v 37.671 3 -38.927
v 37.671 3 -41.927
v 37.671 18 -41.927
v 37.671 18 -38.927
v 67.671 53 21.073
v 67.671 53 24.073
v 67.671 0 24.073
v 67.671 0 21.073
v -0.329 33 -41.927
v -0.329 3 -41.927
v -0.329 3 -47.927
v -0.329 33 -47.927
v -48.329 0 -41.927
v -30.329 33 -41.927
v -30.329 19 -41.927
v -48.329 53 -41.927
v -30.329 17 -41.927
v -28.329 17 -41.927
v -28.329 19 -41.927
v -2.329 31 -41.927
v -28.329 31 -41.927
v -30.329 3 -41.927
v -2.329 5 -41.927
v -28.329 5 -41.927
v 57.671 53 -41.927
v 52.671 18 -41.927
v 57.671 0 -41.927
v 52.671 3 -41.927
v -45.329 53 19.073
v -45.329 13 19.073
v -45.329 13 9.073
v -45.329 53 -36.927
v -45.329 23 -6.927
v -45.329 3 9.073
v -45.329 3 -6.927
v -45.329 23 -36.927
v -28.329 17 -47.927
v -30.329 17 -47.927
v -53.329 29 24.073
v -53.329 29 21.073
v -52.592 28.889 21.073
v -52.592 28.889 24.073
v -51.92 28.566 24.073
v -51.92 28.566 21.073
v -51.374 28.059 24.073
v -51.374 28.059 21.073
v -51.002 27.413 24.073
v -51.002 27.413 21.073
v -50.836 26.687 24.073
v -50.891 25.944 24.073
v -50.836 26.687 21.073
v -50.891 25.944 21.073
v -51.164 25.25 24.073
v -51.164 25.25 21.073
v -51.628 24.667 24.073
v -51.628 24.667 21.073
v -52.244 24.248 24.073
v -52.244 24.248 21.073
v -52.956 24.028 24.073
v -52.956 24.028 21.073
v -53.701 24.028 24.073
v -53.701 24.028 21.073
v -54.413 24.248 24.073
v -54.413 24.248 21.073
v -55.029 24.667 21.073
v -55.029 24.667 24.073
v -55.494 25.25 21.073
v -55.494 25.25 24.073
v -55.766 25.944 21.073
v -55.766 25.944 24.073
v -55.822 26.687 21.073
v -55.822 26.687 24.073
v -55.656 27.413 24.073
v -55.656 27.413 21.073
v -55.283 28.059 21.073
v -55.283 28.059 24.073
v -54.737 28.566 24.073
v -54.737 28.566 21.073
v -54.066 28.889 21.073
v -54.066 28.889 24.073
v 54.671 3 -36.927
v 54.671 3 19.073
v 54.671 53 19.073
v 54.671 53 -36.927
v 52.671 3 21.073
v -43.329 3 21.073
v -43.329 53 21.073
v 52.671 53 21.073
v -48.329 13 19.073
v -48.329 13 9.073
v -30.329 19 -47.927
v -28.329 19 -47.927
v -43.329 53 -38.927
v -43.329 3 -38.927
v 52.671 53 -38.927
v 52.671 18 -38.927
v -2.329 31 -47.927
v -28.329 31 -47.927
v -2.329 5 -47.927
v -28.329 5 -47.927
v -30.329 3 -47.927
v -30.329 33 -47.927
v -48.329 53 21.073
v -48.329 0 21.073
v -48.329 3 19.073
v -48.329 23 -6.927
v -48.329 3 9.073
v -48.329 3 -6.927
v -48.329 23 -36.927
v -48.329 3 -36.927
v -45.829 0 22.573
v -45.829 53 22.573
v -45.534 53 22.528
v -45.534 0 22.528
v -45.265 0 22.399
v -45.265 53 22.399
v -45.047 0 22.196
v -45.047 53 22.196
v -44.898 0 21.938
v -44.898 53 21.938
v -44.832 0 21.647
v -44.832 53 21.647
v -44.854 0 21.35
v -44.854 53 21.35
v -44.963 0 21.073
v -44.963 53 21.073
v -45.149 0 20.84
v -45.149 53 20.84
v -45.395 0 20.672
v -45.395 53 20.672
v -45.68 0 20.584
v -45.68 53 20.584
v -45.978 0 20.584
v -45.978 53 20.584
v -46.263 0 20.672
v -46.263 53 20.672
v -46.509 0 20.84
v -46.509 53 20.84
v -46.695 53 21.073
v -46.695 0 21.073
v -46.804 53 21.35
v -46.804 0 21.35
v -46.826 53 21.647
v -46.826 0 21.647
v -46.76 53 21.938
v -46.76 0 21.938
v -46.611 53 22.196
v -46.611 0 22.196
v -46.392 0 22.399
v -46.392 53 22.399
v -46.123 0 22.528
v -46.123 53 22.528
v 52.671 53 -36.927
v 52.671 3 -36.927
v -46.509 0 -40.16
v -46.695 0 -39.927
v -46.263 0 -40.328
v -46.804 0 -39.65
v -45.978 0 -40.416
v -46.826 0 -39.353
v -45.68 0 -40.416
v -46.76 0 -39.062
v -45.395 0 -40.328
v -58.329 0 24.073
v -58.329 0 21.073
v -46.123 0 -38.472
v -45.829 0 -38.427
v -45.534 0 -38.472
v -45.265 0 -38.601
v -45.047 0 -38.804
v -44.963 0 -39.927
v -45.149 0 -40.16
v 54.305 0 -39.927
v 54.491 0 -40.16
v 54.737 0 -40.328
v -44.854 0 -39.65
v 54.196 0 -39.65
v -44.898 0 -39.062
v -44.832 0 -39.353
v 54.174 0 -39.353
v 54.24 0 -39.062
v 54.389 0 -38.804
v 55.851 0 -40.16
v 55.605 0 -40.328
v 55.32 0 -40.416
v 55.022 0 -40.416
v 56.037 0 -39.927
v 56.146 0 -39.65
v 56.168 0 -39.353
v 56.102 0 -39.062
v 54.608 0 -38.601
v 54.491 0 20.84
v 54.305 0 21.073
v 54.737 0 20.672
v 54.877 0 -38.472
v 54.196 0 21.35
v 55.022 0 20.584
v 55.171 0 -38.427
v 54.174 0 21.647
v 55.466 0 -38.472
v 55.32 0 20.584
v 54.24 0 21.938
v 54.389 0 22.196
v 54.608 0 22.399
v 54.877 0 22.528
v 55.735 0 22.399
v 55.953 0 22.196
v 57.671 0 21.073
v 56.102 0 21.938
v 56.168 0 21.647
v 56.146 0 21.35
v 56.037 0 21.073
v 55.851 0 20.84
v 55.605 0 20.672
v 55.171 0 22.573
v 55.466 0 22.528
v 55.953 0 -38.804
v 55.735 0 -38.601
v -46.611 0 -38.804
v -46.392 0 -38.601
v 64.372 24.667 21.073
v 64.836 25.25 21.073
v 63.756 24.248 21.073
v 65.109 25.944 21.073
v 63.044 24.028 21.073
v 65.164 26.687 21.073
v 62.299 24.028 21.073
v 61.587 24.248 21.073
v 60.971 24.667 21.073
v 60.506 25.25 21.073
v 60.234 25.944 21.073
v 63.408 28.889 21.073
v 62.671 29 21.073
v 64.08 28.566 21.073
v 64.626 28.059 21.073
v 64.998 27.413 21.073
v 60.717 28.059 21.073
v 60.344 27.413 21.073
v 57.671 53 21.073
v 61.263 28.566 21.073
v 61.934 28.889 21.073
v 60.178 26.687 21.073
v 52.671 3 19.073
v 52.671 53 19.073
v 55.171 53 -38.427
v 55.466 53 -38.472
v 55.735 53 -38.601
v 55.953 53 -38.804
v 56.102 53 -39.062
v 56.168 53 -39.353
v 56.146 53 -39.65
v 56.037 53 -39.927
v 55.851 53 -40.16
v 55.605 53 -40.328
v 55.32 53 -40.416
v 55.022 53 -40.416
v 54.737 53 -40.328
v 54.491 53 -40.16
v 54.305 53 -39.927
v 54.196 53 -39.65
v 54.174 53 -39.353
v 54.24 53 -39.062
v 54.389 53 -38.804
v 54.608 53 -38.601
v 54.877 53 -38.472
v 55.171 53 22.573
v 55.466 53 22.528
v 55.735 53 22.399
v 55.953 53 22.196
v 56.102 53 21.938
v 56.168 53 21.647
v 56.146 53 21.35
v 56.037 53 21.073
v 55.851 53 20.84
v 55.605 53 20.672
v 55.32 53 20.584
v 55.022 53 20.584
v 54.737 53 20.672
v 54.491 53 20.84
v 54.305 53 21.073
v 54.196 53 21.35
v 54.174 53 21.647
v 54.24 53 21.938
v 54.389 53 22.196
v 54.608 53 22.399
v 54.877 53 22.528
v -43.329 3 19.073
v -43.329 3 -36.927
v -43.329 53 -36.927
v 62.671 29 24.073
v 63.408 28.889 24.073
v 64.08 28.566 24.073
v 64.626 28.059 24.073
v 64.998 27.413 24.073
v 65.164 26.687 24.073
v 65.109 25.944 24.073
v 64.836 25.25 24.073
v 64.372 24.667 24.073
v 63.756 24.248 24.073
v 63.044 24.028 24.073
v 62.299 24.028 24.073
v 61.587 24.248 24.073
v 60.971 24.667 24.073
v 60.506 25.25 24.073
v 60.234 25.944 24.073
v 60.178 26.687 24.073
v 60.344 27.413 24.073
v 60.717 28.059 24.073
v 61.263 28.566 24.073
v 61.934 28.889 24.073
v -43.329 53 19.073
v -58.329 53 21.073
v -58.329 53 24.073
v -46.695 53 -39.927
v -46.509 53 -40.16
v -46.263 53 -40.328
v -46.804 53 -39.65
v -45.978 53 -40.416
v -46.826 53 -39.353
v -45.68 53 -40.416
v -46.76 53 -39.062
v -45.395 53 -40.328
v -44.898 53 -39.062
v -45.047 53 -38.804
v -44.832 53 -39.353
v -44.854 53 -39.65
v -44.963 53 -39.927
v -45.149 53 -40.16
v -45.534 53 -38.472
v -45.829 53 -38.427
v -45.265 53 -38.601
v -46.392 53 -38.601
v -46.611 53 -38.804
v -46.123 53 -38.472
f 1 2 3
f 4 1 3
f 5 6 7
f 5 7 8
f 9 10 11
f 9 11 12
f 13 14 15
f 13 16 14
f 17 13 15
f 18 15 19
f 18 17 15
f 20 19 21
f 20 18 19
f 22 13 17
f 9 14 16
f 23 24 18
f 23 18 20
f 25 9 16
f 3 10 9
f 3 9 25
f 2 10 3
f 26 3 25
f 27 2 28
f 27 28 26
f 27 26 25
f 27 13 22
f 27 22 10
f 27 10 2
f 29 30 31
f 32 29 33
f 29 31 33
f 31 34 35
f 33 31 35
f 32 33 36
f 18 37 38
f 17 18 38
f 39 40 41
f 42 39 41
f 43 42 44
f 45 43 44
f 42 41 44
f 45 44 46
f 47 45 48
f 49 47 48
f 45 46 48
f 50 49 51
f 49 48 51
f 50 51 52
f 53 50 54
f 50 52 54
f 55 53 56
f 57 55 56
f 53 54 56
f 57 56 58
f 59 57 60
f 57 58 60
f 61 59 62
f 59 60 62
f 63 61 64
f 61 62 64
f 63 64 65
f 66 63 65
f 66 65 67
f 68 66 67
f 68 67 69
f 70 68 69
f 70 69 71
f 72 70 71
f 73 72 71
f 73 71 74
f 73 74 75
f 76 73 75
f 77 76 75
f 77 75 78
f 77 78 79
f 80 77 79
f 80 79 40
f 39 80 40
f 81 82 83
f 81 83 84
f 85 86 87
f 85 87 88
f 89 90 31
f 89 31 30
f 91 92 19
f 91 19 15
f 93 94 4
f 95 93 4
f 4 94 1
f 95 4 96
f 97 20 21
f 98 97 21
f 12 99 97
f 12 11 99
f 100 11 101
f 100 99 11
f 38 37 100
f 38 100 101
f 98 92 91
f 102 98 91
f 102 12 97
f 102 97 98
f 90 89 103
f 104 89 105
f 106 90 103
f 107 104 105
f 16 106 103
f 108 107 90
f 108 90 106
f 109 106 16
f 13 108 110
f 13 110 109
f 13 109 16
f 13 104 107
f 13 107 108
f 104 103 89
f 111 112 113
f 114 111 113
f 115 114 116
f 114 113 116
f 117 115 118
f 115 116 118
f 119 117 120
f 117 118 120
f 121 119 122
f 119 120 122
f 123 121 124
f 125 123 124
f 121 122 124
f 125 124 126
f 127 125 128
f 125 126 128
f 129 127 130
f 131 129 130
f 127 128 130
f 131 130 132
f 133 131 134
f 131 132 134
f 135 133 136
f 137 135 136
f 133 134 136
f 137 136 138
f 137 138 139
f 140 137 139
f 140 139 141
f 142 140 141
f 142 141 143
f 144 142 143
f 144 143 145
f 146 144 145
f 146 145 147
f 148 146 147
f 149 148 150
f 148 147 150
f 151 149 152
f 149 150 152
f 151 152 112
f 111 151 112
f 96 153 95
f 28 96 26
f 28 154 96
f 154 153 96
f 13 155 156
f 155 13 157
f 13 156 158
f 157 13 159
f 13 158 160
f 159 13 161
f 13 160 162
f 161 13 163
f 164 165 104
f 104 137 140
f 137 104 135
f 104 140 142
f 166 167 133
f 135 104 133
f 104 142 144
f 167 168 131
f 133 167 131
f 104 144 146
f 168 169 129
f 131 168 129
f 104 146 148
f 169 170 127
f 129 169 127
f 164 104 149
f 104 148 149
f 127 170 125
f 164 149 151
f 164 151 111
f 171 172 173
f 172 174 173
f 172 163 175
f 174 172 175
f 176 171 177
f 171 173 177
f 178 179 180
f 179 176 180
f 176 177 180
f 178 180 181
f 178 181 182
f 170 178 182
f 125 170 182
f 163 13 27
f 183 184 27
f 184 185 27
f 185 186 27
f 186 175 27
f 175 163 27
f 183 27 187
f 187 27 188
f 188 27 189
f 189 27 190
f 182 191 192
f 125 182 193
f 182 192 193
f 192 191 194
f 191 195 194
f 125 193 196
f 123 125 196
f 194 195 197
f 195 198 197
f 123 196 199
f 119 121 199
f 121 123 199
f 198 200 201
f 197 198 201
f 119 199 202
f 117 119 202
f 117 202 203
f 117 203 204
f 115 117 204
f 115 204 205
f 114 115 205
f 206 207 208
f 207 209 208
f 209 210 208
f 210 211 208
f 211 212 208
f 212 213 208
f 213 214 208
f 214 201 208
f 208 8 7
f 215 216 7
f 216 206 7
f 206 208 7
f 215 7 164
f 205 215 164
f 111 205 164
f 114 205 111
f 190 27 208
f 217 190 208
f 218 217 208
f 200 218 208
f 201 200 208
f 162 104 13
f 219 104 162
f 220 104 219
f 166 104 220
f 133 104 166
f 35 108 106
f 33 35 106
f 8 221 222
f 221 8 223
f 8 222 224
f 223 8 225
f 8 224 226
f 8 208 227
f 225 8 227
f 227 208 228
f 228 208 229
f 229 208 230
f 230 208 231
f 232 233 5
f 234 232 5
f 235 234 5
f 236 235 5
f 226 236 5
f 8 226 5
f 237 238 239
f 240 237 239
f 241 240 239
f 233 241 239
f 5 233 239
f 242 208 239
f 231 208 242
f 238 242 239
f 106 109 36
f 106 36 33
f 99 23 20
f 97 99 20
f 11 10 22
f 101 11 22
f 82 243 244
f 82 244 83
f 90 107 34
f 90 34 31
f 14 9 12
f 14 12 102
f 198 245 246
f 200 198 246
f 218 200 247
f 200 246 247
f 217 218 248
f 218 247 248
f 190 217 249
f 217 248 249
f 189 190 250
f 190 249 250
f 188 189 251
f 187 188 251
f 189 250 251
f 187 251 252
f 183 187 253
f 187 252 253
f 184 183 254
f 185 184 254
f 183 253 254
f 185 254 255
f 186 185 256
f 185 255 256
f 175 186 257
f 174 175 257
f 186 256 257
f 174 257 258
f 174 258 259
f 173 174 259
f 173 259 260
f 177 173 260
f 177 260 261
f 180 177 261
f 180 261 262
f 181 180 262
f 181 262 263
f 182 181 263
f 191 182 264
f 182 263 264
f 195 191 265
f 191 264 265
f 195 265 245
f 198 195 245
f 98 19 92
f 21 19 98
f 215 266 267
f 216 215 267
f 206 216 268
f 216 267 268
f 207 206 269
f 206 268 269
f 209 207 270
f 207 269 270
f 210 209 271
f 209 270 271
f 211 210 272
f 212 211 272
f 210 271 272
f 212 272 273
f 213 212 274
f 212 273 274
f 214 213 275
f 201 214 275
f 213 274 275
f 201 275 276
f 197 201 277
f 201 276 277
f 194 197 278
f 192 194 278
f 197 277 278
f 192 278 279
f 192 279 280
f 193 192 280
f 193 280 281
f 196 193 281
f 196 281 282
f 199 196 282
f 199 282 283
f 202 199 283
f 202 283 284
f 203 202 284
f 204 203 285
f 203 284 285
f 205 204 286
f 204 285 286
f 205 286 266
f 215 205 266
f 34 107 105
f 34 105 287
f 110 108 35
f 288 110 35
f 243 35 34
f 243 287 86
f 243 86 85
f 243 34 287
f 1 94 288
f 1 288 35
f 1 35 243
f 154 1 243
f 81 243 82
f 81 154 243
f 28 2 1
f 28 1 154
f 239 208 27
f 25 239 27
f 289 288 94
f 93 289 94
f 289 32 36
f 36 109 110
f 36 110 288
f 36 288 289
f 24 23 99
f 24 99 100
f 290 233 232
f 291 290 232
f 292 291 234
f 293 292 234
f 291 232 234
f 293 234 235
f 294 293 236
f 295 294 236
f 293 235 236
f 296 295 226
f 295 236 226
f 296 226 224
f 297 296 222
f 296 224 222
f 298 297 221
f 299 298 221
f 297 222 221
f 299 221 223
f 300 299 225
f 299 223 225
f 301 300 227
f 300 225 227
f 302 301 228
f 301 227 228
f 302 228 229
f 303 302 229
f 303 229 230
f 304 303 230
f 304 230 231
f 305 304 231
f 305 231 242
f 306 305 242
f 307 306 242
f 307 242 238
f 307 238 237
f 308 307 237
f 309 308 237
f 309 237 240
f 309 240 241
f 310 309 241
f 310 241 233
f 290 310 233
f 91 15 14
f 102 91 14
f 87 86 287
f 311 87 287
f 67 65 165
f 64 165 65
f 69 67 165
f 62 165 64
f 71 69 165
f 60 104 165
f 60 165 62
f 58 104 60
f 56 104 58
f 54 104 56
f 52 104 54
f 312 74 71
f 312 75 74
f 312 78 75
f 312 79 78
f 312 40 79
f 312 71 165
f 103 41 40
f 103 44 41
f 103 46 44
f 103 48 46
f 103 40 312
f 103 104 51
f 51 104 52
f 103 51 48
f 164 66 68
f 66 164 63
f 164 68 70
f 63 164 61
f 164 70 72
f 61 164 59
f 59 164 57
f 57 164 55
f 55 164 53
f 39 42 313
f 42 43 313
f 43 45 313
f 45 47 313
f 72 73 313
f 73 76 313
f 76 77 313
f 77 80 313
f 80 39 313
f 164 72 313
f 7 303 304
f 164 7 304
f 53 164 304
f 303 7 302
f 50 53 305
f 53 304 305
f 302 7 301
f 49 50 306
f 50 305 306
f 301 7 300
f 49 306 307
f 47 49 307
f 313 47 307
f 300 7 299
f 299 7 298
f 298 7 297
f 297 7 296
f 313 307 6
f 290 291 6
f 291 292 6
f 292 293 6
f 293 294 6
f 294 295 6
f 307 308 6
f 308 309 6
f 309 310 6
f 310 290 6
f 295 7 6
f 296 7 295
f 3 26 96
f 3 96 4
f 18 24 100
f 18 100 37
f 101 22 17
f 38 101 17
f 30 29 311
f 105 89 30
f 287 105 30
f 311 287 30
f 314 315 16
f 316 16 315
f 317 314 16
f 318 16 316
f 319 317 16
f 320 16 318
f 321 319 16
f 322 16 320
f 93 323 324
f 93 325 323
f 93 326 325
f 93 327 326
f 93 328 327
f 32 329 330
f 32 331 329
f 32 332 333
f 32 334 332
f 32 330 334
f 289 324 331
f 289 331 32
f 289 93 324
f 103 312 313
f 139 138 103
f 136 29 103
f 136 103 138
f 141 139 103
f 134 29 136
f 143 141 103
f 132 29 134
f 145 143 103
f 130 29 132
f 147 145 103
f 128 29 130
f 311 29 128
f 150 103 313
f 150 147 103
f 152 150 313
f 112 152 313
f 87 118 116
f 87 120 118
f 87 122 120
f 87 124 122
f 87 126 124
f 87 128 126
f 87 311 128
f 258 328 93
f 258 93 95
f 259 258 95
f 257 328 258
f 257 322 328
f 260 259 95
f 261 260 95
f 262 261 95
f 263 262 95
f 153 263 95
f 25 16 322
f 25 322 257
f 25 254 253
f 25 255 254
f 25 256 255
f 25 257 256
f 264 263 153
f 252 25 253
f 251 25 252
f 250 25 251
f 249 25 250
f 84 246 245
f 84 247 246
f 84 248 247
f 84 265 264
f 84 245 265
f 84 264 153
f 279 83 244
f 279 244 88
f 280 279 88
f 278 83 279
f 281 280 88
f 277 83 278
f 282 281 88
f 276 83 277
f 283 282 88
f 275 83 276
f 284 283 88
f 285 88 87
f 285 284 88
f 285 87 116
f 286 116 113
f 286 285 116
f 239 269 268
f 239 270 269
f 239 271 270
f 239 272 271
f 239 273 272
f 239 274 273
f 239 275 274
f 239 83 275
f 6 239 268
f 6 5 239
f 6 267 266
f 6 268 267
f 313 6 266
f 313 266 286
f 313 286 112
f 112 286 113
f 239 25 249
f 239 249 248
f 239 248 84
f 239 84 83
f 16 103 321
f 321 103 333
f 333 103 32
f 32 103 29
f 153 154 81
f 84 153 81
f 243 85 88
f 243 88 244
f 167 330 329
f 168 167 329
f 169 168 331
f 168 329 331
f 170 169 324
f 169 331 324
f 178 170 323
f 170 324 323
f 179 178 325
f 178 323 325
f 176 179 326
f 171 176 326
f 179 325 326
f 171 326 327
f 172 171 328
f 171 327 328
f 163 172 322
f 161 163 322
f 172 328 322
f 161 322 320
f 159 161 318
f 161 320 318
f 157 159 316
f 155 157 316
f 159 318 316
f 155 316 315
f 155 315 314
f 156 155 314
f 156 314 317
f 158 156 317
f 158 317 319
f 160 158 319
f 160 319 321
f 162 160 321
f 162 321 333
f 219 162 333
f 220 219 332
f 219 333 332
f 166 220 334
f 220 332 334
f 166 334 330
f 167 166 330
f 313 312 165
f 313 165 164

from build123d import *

# Parameters (mm, degrees)
CROQUIS1_W                   = 100
CROQUIS1_H                   = 60
SALIENTE_EXTRUIR1_DEPTH      = 3
SALIENTE_EXTRUIR2_DEPTH      = 50
SALIENTE_EXTRUIR2_DEPTH_BACK = 3
CROQUIS2_W                   = 106
CROQUIS2_H                   = 66
CROQUIS2_W_2                 = 100
CROQUIS2_H_2                 = 60
CROQUIS3_W                   = 2
CROQUIS3_H                   = 2
SALIENTE_EXTRUIR3_DEPTH      = 50
CROQUIS4_W                   = 30
CROQUIS4_H                   = 20
CROQUIS4_W_2                 = 10
CROQUIS4_H_2                 = 10
CORTAR_EXTRUIR2_DEPTH        = 24
CROQUIS5_W                   = 30
CROQUIS5_H                   = 30
CROQUIS5_W_2                 = 26
CROQUIS5_H_2                 = 26
SALIENTE_EXTRUIR4_DEPTH      = 6
CROQUIS6_W                   = 2
CROQUIS6_H                   = 2
CORTAR_EXTRUIR3_DEPTH        = 6
CROQUIS7_W                   = 15
CROQUIS7_H                   = 15
CORTAR_EXTRUIR4_DEPTH        = 6
CROQUIS8_R                   = 1
CORTAR_EXTRUIR5_DEPTH        = 53
CROQUIS9_W                   = 3
CROQUIS9_H                   = 53
SALIENTE_EXTRUIR5_DEPTH      = 10
CROQUIS10_W                  = 3
CROQUIS10_H                  = 53
SALIENTE_EXTRUIR6_DEPTH      = 10
CROQUIS12_R                  = 2.5
CORTAR_EXTRUIR6_DEPTH        = 10


with BuildPart() as part:
    # Croquis1 → Saliente-Extruir1 (new body)
    with BuildSketch(Plane(origin=(0, 0, 0), x_dir=(1, 0, 0), z_dir=(0, 1, 0))):
        with Locations((4.671280277, 8.92733564)):
            Rectangle(CROQUIS1_W, CROQUIS1_H)
    extrude(amount=SALIENTE_EXTRUIR1_DEPTH)

    # Croquis2 → Saliente-Extruir2 (add, two sides: drawn at the far end of the back side and taken through both)
    with BuildSketch(Plane(origin=(0, 3, 0), x_dir=(1, 0, 0), z_dir=(0, 1, 0)).offset(-SALIENTE_EXTRUIR2_DEPTH_BACK)):
        with Locations((4.671280277, 8.92733564)):
            Rectangle(CROQUIS2_W, CROQUIS2_H)
        with Locations((4.671280277, 8.92733564)):
            Rectangle(CROQUIS2_W_2, CROQUIS2_H_2, mode=Mode.SUBTRACT)
    extrude(amount=SALIENTE_EXTRUIR2_DEPTH + SALIENTE_EXTRUIR2_DEPTH_BACK)

    # Croquis3 → Saliente-Extruir3 (add)
    with BuildSketch(Plane(origin=(0, 3, 0), x_dir=(1, 0, 0), z_dir=(0, 1, 0))):
        with Locations((-44.328719723, 37.92733564)):
            Rectangle(CROQUIS3_W, CROQUIS3_H)
        with Locations((-44.328719723, -20.07266436)):
            Rectangle(CROQUIS3_W, CROQUIS3_H)
        with Locations((53.671280277, -20.07266436)):
            Rectangle(CROQUIS3_W, CROQUIS3_H)
        with Locations((53.671280277, 37.92733564)):
            Rectangle(CROQUIS3_W, CROQUIS3_H)
    extrude(amount=SALIENTE_EXTRUIR3_DEPTH)

    # Croquis4 → Cortar-Extruir2 (cut)
    with BuildSketch(Plane.ZY.offset(48.328719723)):
        with Locations((-21.92733564, 13)):
            Rectangle(CROQUIS4_W, CROQUIS4_H)
        with Locations((14.07266436, 8)):
            Rectangle(CROQUIS4_W_2, CROQUIS4_H_2)
    extrude(amount=-CORTAR_EXTRUIR2_DEPTH, mode=Mode.SUBTRACT)

    # Croquis5 → Saliente-Extruir4 (add)
    with BuildSketch(Plane(origin=(0, 0, -41.92733564), x_dir=(-1, 0, 0), z_dir=(0, 0, -1))):
        with Locations((15.328719723, 18)):
            Rectangle(CROQUIS5_W, CROQUIS5_H)
        with Locations((15.328719723, 18)):
            Rectangle(CROQUIS5_W_2, CROQUIS5_H_2, mode=Mode.SUBTRACT)
    extrude(amount=SALIENTE_EXTRUIR4_DEPTH)

    # Croquis6 → Cortar-Extruir3 (cut)
    with BuildSketch(Plane(origin=(0, 0, -47.92733564), x_dir=(-1, 0, 0), z_dir=(0, 0, -1))):
        with Locations((29.328719723, 18)):
            Rectangle(CROQUIS6_W, CROQUIS6_H)
    extrude(amount=-CORTAR_EXTRUIR3_DEPTH, mode=Mode.SUBTRACT)

    # Croquis7 → Cortar-Extruir4 (cut)
    with BuildSketch(Plane(origin=(0, 0, -41.92733564), x_dir=(-1, 0, 0), z_dir=(0, 0, -1))):
        with Locations((-45.171280277, 10.5)):
            Rectangle(CROQUIS7_W, CROQUIS7_H)
    extrude(amount=-CORTAR_EXTRUIR4_DEPTH, mode=Mode.SUBTRACT)

    # Croquis8 → Cortar-Extruir5 (cut)
    with BuildSketch(Plane(origin=(0, 53, 0), x_dir=(1, 0, 0), z_dir=(0, 1, 0))):
        with Locations(Location((-45.828719723, 39.42733564, 0), (0, 0, 270))):
            Circle(CROQUIS8_R)
        with Locations(Location((55.171280277, 39.42733564, 0), (0, 0, 270))):
            Circle(CROQUIS8_R)
        with Locations(Location((55.171280277, -21.57266436, 0), (0, 0, 270))):
            Circle(CROQUIS8_R)
        with Locations(Location((-45.828719723, -21.57266436, 0), (0, 0, 270))):
            Circle(CROQUIS8_R)
    extrude(amount=-CORTAR_EXTRUIR5_DEPTH, mode=Mode.SUBTRACT)

    # Croquis9 → Saliente-Extruir5 (add)
    with BuildSketch(Plane(origin=(57.671280277, 0, 0), x_dir=(0, 0, -1), z_dir=(1, 0, 0))):
        with Locations((-22.57266436, 26.5)):
            Rectangle(CROQUIS9_W, CROQUIS9_H)
    extrude(amount=SALIENTE_EXTRUIR5_DEPTH)

    # Croquis10 → Saliente-Extruir6 (add)
    with BuildSketch(Plane.ZY.offset(48.328719723)):
        with Locations((22.57266436, 26.5)):
            Rectangle(CROQUIS10_W, CROQUIS10_H)
    extrude(amount=SALIENTE_EXTRUIR6_DEPTH)

    # Croquis12 → Cortar-Extruir6 (cut)
    with BuildSketch(Plane(origin=(0, 0, 21.07266436), x_dir=(-1, 0, 0), z_dir=(0, 0, -1))):
        with Locations(Location((-62.671280277, 26.5, 0), (0, 0, 90))):
            Circle(CROQUIS12_R)
        with Locations(Location((53.328719723, 26.5, 0), (0, 0, 90))):
            Circle(CROQUIS12_R)
    extrude(amount=-CORTAR_EXTRUIR6_DEPTH, mode=Mode.SUBTRACT)


solid = part.part
